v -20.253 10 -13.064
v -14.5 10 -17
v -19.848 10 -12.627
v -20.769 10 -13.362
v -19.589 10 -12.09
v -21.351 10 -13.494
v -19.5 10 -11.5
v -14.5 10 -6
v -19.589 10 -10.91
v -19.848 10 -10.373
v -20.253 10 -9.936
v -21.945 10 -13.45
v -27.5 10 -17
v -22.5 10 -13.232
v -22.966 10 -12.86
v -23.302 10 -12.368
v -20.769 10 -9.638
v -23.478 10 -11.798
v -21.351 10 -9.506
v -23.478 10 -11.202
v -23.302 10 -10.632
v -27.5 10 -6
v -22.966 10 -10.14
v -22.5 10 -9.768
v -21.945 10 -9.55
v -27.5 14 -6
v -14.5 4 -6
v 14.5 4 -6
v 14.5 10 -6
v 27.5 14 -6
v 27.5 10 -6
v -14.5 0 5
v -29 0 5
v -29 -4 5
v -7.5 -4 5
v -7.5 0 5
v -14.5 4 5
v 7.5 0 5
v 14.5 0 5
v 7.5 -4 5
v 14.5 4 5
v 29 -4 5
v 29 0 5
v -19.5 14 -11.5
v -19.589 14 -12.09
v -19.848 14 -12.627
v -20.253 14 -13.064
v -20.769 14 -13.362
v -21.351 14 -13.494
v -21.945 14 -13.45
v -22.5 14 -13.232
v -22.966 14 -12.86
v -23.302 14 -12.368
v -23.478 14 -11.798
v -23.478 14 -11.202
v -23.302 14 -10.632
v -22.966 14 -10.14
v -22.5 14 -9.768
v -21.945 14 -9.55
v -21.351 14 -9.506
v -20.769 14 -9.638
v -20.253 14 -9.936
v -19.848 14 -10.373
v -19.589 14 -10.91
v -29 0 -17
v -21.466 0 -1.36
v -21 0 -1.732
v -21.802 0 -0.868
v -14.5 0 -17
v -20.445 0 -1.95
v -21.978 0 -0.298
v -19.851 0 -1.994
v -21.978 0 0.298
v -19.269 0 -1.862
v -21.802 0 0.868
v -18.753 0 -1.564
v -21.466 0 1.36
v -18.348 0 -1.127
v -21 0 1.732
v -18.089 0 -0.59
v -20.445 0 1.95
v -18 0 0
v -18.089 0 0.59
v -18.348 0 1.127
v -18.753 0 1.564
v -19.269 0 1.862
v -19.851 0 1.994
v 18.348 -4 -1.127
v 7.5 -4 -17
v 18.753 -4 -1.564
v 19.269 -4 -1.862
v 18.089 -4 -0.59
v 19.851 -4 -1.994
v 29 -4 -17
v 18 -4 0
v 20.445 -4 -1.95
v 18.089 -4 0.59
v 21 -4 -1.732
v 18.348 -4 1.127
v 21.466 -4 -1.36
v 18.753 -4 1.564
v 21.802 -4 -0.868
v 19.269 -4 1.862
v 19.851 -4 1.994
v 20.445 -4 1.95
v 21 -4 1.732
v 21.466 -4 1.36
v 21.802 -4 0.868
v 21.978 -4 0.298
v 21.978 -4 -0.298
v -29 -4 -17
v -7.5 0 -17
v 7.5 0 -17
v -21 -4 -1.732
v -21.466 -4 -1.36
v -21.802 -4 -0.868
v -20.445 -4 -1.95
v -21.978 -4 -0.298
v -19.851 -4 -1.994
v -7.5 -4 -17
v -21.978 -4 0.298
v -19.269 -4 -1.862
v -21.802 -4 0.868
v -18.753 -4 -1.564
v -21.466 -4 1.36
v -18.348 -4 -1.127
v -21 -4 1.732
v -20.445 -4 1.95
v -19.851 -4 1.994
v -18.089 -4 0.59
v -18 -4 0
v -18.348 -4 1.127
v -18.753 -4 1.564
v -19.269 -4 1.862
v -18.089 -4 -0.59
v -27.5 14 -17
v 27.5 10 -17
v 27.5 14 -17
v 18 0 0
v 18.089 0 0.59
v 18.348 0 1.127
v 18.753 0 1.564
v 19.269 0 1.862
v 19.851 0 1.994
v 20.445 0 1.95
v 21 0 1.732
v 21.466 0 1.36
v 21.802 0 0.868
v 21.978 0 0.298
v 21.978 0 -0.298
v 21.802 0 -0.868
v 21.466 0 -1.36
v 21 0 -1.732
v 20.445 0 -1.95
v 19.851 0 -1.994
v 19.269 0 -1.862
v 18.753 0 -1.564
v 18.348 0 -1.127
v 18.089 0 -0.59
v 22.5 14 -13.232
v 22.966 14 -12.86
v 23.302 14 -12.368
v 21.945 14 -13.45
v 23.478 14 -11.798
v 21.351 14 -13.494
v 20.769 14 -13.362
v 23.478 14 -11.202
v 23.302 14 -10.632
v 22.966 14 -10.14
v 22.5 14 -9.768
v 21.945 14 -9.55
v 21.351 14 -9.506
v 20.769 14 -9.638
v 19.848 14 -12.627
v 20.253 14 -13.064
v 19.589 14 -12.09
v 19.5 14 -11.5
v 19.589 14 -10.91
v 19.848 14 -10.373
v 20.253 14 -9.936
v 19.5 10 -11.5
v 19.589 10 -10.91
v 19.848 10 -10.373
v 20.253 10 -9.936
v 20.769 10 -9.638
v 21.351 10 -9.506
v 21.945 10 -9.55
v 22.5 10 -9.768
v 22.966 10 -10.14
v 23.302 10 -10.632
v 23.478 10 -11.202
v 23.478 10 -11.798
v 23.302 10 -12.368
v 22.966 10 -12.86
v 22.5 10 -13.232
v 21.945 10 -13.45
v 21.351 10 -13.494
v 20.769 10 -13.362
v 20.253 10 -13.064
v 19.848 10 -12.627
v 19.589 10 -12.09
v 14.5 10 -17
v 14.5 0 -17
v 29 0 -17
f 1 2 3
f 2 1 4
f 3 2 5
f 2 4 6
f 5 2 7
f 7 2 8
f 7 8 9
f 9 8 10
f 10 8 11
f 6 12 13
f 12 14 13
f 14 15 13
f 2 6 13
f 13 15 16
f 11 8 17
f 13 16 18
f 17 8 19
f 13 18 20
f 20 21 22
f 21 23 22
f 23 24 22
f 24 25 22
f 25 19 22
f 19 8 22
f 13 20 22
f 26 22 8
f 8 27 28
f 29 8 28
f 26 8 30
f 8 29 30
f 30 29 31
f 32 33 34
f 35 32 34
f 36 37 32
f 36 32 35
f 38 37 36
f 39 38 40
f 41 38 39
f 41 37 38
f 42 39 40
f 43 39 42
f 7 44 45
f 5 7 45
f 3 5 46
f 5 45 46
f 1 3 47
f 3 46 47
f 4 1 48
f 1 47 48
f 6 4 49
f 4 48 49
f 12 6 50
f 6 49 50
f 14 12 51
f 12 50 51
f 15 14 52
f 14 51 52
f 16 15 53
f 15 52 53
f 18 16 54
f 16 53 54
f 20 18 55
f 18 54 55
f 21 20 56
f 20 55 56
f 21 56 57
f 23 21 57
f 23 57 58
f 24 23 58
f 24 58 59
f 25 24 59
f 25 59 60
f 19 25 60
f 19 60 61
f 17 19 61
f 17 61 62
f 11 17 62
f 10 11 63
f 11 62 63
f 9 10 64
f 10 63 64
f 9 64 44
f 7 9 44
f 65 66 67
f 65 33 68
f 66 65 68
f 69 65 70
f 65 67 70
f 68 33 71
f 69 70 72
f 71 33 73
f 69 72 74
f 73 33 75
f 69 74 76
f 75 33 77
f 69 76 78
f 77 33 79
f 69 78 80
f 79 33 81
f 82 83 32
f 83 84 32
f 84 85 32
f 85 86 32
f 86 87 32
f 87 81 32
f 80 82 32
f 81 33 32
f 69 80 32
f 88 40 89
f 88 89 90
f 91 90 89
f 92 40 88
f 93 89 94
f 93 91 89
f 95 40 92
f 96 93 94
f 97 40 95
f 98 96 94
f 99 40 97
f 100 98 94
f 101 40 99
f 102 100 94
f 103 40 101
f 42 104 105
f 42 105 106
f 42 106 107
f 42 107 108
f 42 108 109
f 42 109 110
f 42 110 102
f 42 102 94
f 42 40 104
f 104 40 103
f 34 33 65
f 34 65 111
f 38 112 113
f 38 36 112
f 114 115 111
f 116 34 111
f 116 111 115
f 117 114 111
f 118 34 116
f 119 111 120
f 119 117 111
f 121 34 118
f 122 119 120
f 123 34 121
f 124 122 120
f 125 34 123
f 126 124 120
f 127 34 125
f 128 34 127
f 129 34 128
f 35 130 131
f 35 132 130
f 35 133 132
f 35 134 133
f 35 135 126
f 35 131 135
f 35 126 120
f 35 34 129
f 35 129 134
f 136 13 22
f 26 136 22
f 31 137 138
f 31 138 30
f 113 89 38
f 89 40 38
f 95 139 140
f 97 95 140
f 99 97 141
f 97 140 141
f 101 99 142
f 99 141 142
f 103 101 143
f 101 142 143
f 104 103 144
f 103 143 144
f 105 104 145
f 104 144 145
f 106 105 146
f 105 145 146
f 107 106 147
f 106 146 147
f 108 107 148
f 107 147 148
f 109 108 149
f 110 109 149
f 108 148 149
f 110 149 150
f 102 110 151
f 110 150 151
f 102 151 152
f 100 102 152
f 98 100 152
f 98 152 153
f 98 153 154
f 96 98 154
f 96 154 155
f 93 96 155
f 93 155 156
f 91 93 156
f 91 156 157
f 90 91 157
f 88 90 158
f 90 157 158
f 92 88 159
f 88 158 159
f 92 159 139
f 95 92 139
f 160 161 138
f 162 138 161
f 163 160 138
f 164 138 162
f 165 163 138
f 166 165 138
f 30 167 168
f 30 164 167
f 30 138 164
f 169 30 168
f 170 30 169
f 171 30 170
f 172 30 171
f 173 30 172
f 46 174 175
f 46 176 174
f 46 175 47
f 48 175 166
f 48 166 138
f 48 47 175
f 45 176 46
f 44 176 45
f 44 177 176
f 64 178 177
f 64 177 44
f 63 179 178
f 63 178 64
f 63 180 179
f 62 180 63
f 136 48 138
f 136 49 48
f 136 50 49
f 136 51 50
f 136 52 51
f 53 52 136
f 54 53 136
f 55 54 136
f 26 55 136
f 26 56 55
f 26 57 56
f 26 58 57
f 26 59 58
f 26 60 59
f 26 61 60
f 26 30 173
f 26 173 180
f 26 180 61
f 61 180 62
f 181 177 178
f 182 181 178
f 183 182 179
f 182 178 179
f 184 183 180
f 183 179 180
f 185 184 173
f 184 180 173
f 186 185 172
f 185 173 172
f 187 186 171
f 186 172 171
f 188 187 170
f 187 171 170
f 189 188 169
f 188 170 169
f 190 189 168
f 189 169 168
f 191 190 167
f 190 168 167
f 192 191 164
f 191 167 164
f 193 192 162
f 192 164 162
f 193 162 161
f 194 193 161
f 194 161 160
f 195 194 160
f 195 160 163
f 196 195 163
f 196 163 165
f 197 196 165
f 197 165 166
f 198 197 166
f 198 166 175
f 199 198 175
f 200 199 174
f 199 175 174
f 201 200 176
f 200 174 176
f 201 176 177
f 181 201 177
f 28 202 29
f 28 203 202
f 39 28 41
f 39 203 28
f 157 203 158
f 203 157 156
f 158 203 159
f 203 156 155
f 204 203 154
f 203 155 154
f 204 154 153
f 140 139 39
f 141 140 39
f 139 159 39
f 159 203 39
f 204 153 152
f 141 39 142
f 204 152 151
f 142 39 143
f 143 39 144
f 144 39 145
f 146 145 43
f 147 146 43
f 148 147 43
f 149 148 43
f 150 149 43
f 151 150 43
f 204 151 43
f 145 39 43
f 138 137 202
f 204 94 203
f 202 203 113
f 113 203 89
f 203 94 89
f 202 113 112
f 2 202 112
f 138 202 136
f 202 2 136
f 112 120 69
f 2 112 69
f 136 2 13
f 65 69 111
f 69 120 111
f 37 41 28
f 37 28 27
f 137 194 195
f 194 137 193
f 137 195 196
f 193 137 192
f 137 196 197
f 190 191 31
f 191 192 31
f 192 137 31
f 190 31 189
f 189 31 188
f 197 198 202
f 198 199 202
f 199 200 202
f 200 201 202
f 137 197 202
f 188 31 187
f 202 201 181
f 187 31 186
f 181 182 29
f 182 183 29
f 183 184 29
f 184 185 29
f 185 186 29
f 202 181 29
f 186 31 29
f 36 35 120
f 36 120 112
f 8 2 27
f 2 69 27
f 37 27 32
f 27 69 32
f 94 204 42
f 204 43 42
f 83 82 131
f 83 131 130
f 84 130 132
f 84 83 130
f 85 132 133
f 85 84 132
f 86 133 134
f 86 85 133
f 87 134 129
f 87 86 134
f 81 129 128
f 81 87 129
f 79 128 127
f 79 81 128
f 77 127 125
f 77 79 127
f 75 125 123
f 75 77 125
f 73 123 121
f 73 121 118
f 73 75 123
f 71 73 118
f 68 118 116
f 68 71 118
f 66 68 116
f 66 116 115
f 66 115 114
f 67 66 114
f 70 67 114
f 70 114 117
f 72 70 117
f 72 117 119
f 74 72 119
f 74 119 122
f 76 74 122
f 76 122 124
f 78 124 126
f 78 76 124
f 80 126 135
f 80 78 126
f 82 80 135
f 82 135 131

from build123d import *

# Parameters (mm, degrees)
F0_W      = 58
F0_H      = 10
F0_R      = 2
F1_DEPTH  = 4
F2_W      = 29
F2_H      = 10
F3_DEPTH  = 4
F4_W      = 15
F4_H      = 10
F5_DEPTH  = 4
F6_DEPTH  = 12
F7_W      = 29
F7_H      = 11
F8_DEPTH  = 6
F9_W      = 29
F9_H      = 11
F9_W_2    = 13
F10_DEPTH = 4
F11_R     = 2
F12_DEPTH = 4


with BuildPart() as f1:
    # F0 (on Front) → F1 (new body)
    with BuildSketch(Plane.XZ):
        Rectangle(F0_W, F0_H)
        with Locations((-20, 0)):
            Circle(F0_R, mode=Mode.SUBTRACT)
        with BuildLine():
            ThreePointArc((22, 0), (20, -2), (18, 0))
            ThreePointArc((18, 0), (20, 2), (22, 0))
        make_face(mode=Mode.SUBTRACT)
    extrude(amount=F1_DEPTH)

    # F2 (on face) → F3 (join)
    with BuildSketch(Plane(origin=(0, 0, 0), x_dir=(-1, 0, 0), z_dir=(0, 1, 0))):
        Rectangle(F2_W, F2_H)
    extrude(amount=F3_DEPTH)

    # F4 (on face) → F5 (cut)
    with BuildSketch(Plane.XZ.offset(4)):
        Rectangle(F4_W, F4_H)
    extrude(amount=-F5_DEPTH, mode=Mode.SUBTRACT)

    # F6 (add): a face of the model
    f6_faces = [f1.faces().sort_by_distance(p)[0] for p in [
        (-21.75, -0.5854912467, -5),
    ]]
    extrude(f6_faces, amount=F6_DEPTH)

    # F7 (on face) → F8 (join)
    with BuildSketch(Plane(origin=(0, 4, 0), x_dir=(-1, 0, 0), z_dir=(0, 1, 0))):
        with Locations((0, -11.5)):
            Rectangle(F7_W, F7_H)
    extrude(amount=F8_DEPTH)

    # F9 (on face) → F10 (join)
    with BuildSketch(Plane(origin=(0, 10, 0), x_dir=(-1, 0, 0), z_dir=(0, 1, 0))):
        with Locations((0, -11.5)):
            Rectangle(F9_W, F9_H)
        with Locations((-21, -11.5)):
            Rectangle(F9_W_2, F9_H)
        with Locations((21, -11.5)):
            Rectangle(F9_W_2, F9_H)
    extrude(amount=F10_DEPTH)

    # F11 (on face) → F12 (cut)
    with BuildSketch(Plane(origin=(0, 14, 0), x_dir=(-1, 0, 0), z_dir=(0, 1, 0))):
        with Locations((-21.5, -11.5)):
            Circle(F11_R)
        with BuildLine():
            ThreePointArc((23.5, -11.5), (21.5, -9.5), (19.5, -11.5))
            ThreePointArc((19.5, -11.5), (21.5, -13.5), (23.5, -11.5))
        make_face()
    extrude(amount=-F12_DEPTH, mode=Mode.SUBTRACT)


solid = f1.part
